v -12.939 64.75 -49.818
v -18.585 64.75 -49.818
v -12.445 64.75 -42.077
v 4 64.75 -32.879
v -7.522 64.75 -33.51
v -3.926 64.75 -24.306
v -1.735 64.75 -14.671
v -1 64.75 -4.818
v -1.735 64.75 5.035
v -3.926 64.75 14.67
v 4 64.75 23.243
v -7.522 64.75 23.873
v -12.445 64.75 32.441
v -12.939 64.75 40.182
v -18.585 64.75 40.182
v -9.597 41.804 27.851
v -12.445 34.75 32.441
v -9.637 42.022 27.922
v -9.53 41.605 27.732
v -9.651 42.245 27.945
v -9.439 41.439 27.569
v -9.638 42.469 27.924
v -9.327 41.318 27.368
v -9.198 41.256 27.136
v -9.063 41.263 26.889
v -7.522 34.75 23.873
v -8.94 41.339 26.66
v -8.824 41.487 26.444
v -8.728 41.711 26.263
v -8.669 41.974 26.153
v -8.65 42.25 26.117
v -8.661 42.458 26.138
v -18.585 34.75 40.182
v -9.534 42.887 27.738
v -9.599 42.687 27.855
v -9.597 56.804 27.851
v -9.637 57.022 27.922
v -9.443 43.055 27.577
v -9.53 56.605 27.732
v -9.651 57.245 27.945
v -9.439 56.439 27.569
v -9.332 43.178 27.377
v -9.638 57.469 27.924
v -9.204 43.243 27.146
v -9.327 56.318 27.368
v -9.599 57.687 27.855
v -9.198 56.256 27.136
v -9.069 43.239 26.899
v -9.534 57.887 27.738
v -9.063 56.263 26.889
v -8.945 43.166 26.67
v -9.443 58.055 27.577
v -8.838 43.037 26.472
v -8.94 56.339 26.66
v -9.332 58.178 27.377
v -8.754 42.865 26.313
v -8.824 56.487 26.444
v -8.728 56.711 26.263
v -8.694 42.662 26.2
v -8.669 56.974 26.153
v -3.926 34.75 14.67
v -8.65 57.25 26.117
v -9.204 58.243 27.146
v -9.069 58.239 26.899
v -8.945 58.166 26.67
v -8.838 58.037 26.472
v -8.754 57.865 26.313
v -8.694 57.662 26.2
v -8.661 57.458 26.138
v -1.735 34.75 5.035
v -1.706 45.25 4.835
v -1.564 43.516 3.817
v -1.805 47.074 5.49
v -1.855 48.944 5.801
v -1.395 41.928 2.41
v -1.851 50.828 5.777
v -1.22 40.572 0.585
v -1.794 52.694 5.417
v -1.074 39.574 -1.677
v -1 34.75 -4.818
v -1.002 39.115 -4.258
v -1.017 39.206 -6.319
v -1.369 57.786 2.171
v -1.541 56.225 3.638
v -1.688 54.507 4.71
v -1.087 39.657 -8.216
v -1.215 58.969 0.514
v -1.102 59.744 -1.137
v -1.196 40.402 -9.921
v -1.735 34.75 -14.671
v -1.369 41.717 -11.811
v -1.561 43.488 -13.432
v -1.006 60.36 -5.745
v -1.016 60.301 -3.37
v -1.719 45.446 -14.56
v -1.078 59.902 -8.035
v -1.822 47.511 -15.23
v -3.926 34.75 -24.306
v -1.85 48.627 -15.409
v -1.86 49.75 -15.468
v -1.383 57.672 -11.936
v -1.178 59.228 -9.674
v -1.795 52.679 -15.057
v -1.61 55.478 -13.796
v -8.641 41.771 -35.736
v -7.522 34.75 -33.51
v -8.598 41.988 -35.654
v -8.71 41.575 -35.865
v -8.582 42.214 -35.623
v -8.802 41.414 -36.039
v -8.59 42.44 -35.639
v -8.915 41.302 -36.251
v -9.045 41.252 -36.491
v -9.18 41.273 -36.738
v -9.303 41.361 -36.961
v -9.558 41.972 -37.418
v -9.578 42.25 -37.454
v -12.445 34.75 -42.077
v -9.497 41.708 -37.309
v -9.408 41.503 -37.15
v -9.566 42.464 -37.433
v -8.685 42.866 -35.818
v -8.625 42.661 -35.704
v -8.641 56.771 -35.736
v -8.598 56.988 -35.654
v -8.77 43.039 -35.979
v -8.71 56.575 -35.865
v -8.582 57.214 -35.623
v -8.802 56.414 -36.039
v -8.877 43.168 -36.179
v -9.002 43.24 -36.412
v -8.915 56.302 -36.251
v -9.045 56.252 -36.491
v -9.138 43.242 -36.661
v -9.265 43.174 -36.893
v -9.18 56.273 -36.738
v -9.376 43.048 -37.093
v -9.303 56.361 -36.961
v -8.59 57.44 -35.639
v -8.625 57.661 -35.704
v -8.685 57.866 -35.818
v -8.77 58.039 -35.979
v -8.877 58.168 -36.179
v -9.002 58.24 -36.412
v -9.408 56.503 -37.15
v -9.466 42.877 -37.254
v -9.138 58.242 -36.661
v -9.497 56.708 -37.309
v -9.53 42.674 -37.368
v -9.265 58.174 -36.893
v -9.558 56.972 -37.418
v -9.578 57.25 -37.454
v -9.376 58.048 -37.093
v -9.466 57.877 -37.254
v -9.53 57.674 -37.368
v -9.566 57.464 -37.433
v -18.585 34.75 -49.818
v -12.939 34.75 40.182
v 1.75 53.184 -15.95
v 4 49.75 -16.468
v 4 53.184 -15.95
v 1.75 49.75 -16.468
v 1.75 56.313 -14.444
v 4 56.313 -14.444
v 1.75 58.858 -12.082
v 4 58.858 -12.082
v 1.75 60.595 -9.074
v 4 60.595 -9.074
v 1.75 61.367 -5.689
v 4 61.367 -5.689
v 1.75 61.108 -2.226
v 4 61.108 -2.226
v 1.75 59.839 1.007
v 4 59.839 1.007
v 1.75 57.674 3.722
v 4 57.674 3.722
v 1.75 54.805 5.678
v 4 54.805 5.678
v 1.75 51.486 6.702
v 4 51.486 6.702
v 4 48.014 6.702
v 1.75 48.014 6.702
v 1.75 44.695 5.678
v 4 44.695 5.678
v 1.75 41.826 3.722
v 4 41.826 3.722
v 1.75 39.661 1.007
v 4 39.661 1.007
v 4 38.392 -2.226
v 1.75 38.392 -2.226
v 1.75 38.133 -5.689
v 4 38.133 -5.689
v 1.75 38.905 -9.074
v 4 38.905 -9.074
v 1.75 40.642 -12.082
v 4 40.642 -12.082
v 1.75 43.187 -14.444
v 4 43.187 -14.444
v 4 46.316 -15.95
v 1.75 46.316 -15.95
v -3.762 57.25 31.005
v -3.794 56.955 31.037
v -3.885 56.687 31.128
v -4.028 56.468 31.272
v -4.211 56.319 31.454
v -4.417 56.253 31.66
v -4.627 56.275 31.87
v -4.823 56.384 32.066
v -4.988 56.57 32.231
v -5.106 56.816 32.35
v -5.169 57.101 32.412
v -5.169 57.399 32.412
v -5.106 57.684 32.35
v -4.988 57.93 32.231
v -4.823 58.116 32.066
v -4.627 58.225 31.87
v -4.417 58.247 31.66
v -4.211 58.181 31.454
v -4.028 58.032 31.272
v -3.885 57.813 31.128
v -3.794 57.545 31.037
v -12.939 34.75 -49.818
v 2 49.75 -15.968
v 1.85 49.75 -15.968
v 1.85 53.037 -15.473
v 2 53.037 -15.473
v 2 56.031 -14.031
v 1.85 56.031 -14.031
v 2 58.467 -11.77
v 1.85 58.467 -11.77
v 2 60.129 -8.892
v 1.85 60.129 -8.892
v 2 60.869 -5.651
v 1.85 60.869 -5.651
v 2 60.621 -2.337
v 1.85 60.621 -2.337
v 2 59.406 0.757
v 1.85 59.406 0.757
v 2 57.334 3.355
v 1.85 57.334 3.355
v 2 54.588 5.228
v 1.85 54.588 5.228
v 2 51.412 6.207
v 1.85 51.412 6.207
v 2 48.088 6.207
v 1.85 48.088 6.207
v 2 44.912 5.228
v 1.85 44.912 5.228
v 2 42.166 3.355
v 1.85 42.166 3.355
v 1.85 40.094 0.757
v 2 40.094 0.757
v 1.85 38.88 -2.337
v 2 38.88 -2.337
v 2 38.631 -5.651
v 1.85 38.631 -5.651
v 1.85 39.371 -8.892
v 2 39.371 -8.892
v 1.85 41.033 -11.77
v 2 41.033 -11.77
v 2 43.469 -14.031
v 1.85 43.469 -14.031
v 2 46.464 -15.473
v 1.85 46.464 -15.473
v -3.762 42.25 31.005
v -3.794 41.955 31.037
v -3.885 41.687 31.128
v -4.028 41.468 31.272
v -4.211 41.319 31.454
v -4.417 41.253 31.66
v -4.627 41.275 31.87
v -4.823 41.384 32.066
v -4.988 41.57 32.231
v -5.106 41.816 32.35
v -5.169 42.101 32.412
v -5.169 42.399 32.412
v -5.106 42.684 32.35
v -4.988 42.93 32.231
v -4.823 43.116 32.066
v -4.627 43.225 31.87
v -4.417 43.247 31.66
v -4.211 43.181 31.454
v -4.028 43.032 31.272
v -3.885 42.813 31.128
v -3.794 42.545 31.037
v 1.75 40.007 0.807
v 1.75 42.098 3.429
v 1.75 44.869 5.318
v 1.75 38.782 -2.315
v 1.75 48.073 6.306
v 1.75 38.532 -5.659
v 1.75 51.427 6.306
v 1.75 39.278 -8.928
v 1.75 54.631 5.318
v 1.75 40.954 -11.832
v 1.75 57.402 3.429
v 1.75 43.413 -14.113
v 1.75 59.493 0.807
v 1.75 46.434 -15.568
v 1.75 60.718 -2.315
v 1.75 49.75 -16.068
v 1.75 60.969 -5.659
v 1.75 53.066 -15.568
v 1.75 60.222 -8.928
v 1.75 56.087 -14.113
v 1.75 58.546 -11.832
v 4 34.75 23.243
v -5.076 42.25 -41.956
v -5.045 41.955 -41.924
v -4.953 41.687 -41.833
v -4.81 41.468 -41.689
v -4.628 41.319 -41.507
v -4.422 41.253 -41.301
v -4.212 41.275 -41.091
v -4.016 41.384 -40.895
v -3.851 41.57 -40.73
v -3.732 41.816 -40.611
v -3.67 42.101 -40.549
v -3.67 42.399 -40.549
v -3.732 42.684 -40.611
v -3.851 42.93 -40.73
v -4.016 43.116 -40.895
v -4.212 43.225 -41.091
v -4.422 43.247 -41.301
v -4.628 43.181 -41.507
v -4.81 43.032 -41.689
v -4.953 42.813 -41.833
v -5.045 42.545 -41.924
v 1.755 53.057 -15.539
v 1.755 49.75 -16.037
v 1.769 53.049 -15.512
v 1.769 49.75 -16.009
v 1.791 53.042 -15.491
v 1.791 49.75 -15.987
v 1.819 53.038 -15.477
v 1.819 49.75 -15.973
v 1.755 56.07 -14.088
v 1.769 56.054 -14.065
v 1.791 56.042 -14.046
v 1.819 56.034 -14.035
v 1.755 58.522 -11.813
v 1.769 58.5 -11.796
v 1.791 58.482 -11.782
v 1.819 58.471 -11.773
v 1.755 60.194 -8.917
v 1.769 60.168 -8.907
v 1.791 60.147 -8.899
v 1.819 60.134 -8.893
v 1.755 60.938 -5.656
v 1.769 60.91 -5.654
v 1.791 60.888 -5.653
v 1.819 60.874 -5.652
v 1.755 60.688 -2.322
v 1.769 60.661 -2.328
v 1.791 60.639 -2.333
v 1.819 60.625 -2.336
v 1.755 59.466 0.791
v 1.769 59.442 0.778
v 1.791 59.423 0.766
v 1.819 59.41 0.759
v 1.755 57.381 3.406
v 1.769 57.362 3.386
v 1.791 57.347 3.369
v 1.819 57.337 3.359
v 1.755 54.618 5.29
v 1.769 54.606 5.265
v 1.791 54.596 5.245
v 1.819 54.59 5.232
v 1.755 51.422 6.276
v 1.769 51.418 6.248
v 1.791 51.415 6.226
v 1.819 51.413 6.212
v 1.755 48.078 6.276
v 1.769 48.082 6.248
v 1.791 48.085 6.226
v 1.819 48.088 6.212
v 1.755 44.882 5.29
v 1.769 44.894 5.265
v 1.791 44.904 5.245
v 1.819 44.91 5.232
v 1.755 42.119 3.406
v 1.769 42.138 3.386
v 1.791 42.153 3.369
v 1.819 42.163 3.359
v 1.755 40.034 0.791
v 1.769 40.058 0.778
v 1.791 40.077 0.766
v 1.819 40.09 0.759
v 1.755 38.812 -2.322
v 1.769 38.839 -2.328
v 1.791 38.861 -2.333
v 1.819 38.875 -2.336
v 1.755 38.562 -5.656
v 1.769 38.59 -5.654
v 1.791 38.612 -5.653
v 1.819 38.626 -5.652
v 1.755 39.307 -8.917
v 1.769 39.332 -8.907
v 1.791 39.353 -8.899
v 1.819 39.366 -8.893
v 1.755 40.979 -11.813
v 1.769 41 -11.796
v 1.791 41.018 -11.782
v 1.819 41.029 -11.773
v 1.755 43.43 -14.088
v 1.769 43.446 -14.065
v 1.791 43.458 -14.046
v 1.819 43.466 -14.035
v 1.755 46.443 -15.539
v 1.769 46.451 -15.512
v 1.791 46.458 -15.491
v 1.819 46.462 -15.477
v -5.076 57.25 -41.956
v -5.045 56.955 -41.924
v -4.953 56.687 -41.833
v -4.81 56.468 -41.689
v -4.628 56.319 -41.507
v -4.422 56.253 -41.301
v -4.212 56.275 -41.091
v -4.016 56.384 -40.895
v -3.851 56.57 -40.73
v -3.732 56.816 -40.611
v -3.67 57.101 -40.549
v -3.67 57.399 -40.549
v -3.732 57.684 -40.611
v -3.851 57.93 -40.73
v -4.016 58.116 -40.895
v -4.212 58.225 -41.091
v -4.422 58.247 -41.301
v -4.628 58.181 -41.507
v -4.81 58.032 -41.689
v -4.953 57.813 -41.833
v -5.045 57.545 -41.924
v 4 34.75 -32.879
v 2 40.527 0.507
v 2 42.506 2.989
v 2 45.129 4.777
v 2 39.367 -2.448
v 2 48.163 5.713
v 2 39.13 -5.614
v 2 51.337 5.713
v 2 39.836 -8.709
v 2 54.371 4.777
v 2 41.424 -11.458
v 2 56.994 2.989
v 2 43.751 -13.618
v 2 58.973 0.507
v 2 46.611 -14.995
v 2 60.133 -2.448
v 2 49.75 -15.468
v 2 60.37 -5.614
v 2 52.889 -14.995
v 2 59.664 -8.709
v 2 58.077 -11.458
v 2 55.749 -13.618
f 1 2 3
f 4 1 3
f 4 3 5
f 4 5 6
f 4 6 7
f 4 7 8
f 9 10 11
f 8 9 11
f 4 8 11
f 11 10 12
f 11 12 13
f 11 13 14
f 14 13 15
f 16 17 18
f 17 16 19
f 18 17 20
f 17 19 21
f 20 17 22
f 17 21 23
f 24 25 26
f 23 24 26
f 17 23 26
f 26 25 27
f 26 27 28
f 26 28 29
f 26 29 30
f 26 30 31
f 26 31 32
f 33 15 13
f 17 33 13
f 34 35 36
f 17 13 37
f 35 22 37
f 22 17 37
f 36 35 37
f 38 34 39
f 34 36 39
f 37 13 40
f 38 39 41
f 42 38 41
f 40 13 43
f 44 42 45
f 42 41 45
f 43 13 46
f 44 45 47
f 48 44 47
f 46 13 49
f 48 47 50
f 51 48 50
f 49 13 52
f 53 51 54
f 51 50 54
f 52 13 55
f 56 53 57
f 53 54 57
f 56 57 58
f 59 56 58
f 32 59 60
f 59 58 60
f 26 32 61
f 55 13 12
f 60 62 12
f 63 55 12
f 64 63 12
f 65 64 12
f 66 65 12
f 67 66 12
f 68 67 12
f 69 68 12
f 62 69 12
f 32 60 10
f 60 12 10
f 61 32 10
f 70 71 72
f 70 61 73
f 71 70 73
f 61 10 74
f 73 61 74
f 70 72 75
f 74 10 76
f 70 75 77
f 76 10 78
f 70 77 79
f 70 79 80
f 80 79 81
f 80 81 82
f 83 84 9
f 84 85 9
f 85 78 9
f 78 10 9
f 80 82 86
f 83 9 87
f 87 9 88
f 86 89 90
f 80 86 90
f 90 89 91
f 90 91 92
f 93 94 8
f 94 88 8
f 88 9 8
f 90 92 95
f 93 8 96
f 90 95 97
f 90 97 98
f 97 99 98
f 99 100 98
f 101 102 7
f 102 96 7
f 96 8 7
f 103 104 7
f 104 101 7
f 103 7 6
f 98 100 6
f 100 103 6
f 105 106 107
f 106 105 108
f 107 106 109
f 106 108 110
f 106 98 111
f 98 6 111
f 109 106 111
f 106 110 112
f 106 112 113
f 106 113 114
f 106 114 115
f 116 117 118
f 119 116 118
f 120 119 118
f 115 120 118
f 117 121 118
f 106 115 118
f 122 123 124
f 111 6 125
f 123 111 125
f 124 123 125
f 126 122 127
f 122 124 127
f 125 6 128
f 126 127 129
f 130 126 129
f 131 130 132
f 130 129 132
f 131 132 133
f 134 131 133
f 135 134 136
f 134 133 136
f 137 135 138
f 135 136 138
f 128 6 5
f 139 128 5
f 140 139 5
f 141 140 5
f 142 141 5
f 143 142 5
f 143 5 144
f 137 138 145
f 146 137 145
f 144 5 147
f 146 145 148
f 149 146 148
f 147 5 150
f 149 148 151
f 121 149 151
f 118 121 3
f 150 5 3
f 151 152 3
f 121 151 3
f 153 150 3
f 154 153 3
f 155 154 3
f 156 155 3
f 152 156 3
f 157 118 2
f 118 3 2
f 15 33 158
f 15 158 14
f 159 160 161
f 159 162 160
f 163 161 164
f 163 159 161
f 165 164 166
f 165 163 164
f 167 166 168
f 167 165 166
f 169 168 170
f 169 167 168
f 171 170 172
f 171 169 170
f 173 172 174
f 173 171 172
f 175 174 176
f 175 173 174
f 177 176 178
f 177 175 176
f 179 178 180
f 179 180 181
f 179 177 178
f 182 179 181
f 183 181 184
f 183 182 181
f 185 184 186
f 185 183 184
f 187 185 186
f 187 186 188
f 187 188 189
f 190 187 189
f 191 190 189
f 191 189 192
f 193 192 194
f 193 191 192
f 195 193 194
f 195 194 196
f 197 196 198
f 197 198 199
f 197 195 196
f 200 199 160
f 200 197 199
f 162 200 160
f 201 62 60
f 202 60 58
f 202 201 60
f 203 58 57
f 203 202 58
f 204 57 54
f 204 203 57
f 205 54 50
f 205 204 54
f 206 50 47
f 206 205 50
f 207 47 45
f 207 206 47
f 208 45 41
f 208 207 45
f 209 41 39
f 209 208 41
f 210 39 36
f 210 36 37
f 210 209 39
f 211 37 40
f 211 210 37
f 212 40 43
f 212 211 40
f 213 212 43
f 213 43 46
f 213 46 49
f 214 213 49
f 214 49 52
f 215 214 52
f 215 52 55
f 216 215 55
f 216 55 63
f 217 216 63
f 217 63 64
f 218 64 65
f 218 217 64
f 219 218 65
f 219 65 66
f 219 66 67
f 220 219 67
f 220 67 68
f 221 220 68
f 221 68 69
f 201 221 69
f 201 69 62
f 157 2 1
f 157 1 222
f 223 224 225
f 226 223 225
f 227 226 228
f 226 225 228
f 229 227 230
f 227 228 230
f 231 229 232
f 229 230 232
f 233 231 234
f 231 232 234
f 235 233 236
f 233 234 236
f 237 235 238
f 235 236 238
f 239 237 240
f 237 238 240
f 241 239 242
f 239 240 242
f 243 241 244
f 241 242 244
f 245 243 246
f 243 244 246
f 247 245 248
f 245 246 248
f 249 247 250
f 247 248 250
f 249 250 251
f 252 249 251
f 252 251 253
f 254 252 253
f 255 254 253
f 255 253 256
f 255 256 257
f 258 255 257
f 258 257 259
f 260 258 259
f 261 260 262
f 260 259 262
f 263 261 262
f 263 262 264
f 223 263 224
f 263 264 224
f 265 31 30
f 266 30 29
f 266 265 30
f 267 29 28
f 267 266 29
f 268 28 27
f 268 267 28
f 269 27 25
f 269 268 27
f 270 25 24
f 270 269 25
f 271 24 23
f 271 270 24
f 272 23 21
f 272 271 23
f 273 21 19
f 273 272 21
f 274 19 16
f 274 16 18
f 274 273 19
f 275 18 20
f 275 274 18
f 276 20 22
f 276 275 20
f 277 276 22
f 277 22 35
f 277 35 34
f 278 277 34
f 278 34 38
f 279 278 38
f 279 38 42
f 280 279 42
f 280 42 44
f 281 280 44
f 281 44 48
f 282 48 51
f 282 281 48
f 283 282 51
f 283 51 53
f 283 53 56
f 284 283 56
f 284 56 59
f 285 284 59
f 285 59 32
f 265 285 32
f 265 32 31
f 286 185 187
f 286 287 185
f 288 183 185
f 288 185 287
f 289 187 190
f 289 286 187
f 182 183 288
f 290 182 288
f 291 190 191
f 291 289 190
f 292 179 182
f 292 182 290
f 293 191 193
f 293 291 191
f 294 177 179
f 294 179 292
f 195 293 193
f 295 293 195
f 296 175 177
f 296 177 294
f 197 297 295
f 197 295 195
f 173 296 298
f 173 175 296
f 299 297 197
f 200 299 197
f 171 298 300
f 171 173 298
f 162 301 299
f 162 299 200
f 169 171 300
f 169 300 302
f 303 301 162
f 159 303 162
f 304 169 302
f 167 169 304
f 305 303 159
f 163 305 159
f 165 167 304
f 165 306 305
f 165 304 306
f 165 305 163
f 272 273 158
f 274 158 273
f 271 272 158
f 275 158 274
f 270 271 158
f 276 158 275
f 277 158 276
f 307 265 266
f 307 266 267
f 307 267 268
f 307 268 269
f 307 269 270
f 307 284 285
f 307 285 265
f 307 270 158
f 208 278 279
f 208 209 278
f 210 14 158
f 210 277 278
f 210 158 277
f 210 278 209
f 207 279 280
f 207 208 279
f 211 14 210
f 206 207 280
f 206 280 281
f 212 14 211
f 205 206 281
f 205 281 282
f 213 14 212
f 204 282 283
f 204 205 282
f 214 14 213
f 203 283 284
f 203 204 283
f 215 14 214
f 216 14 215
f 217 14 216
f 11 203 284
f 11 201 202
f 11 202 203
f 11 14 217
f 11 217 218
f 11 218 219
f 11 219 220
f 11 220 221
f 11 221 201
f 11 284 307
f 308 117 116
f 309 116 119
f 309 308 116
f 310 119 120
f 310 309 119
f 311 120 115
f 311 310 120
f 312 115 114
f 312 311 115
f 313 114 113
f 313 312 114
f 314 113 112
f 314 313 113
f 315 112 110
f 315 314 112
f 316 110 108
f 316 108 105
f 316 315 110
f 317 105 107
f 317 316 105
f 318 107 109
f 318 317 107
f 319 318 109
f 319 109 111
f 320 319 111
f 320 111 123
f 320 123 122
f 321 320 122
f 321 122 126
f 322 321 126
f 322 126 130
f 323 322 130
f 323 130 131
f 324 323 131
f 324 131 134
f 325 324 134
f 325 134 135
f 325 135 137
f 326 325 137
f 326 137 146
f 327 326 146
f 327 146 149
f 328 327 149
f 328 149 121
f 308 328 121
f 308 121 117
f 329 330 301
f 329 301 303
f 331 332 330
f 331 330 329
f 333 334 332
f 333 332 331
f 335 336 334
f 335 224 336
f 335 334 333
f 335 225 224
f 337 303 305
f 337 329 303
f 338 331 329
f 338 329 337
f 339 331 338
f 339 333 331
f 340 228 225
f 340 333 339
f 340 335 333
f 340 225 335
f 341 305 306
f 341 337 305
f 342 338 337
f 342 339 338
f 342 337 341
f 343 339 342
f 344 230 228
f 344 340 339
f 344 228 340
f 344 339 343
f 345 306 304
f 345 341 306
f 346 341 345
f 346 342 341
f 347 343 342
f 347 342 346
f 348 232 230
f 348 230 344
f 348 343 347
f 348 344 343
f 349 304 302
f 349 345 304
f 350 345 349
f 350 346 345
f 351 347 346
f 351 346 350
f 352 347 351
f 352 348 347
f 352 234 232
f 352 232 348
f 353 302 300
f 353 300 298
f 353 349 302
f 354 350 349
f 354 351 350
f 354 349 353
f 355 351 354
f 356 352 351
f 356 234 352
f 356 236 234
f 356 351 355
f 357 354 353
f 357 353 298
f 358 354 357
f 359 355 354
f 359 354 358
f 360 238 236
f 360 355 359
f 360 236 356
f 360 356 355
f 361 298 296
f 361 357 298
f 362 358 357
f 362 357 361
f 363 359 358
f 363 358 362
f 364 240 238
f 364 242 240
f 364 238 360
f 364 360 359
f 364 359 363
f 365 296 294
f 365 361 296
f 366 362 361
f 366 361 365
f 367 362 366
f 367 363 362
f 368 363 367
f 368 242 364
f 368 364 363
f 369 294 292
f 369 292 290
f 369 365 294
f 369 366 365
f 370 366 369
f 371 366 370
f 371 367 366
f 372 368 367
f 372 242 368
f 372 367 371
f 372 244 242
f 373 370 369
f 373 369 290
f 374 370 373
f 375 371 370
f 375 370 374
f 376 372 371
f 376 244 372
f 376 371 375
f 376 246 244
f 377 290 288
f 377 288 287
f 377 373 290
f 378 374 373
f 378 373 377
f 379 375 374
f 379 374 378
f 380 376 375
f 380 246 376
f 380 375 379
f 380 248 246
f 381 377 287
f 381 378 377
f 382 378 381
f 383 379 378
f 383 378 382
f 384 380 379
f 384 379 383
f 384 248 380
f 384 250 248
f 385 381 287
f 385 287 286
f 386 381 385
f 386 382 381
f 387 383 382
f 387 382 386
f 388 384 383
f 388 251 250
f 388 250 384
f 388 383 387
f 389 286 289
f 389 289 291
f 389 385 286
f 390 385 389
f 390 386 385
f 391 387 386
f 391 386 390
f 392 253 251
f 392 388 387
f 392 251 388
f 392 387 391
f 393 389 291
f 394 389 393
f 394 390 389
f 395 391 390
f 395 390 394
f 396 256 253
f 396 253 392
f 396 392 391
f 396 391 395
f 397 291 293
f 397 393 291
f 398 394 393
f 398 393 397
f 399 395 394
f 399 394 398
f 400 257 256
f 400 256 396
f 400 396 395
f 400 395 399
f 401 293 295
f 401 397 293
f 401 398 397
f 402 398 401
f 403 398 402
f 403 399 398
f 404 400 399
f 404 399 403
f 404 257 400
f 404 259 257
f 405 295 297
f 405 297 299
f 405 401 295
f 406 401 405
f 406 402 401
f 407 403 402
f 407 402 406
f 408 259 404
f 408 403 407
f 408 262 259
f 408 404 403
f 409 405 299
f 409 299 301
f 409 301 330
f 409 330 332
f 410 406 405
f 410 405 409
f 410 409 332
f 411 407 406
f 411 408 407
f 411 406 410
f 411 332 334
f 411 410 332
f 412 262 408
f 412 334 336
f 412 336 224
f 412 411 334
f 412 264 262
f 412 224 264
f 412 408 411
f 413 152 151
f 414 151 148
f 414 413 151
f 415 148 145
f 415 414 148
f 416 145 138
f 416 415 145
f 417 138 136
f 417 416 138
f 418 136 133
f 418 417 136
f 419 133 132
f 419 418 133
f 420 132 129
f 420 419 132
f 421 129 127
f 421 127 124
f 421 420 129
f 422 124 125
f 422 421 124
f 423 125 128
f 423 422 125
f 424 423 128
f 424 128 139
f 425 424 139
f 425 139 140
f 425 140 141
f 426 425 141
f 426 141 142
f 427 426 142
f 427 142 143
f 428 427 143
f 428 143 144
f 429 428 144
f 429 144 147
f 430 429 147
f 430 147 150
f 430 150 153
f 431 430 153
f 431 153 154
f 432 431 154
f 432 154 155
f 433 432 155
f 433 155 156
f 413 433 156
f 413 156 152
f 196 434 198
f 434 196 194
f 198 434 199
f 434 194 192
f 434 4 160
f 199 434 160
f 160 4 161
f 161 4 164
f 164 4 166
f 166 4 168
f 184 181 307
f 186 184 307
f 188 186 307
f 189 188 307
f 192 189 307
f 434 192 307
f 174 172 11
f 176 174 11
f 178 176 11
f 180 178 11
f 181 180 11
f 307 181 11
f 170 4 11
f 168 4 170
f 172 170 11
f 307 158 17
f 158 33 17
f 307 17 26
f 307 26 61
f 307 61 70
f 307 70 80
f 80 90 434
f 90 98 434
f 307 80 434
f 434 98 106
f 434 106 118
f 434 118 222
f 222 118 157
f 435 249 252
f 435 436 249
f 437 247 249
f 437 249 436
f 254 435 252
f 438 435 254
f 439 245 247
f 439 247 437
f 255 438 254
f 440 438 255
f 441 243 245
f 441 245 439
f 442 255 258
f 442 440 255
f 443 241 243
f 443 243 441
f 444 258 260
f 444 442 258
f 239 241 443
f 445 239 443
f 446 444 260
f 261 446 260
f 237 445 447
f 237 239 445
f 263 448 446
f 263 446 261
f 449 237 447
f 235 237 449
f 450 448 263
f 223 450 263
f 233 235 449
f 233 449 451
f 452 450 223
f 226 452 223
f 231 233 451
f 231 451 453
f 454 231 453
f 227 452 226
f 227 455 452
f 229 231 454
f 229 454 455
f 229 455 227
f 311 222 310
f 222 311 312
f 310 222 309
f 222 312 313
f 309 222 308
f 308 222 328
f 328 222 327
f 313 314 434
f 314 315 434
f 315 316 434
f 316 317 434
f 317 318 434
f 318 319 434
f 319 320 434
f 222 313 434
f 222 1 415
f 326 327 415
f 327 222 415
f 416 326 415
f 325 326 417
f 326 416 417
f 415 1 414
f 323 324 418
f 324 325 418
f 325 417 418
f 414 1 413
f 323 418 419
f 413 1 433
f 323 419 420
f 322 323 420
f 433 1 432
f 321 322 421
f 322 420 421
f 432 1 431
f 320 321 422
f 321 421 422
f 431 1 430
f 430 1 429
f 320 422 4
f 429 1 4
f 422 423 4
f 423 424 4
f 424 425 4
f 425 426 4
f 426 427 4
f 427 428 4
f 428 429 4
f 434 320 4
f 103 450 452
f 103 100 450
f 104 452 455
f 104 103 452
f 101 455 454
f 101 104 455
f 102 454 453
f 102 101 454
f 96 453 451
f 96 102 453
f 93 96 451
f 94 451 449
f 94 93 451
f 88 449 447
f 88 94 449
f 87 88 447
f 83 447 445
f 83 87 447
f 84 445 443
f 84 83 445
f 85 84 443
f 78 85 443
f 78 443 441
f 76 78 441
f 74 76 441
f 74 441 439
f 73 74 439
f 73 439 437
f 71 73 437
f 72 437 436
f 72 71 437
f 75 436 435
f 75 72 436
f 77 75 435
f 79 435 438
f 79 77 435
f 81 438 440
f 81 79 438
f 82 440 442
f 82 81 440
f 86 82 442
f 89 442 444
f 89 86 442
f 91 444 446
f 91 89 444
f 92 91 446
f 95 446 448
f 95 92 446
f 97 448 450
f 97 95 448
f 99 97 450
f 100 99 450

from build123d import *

# Parameters (mm, degrees)
SKETCH1_R           = 10.65
BOSS_EXTRUDE1_DEPTH = 4
CUT_EXTRUDE2_START  = -2
SKETCH4_R           = 11.65
SKETCH4_R_2         = 10.65
CUT_EXTRUDE2_DEPTH  = 2
CUT_EXTRUDE3_START  = -0.25
SKETCH5_R           = 11.65
SKETCH5_R_2         = 11.15
CUT_EXTRUDE3_DEPTH  = 0.25
FILLET1_R           = 0.1
BOSS_EXTRUDE3_DEPTH = 30
CUT_EXTRUDE6_START  = -30
SKETCH12_R          = 10.65
CUT_EXTRUDE6_DEPTH  = 30
CUT_EXTRUDE7_DEPTH  = 30
SKETCH14_R          = 1
CUT_EXTRUDE8_DEPTH  = 30
SKETCH15_R          = 1
CUT_EXTRUDE9_DEPTH  = 30


with BuildPart() as part:
    # Sketch1 → Boss-Extrude1 (new body)
    with BuildSketch(Plane(origin=(0, 0, 0), x_dir=(0, 0, -1), z_dir=(1, 0, 0))):
        Polygon((44.818066557, 64.750067007), (49.818066557, 64.750067007), (49.818066557, 34.750067007), (44.818066557, 34.750067007), (-35.181933443, 34.750067007), (-40.181933443, 34.750067007), (-40.181933443, 64.750067007), (-35.181933443, 64.750067007), align=None)
        with Locations((4.818066557, 49.750067007)):
            Circle(SKETCH1_R, mode=Mode.SUBTRACT)
    extrude(amount=BOSS_EXTRUDE1_DEPTH)

    # Sketch4 → Cut-Extrude2 (cut)
    with BuildSketch(Plane(origin=(4, 0, 0), x_dir=(0, 0, -1), z_dir=(1, 0, 0)).offset(CUT_EXTRUDE2_START)):
        with Locations((4.818066557, 49.750067007)):
            Circle(SKETCH4_R)
        with Locations((4.818066557, 49.750067007)):
            Circle(SKETCH4_R_2, mode=Mode.SUBTRACT)
    extrude(amount=CUT_EXTRUDE2_DEPTH, mode=Mode.SUBTRACT)

    # Sketch5 → Cut-Extrude3 (cut)
    with BuildSketch(Plane(origin=(2, 0, 0), x_dir=(0, 0, -1), z_dir=(1, 0, 0)).offset(CUT_EXTRUDE3_START)):
        with Locations((4.818066557, 49.750067007)):
            Circle(SKETCH5_R)
        with Locations((4.818066557, 49.750067007)):
            Circle(SKETCH5_R_2, mode=Mode.SUBTRACT)
    extrude(amount=CUT_EXTRUDE3_DEPTH, mode=Mode.SUBTRACT)

    # Fillet1
    fillet1_edges = [part.edges().sort_by_distance(p)[0] for p in [
        (1.75, 49.750067007, 6.331933443),
    ]]
    fillet(fillet1_edges, radius=FILLET1_R)

    # Sketch11 → Boss-Extrude3 (add)
    with BuildSketch(Plane(origin=(0, 64.750067007, 0), x_dir=(1, 0, 0), z_dir=(0, 1, 0))):
        with BuildLine():
            Line((0, 49.818066557), (0, -40.181933443))
            Line((0, -40.181933443), (-18.584993082, -40.181933443))
            ThreePointArc((-18.584993082, -40.181933443), (-1, 4.818066557), (-18.584993082, 49.818066557))
            Line((-18.584993082, 49.818066557), (0, 49.818066557))
        make_face()
    extrude(amount=-BOSS_EXTRUDE3_DEPTH)

    # Sketch12 → Cut-Extrude6 (cut)
    with BuildSketch(Plane(origin=(0, 0, 0), x_dir=(0, 0, -1), z_dir=(1, 0, 0)).offset(CUT_EXTRUDE6_START)):
        with Locations((4.818066557, 49.750067007)):
            Circle(SKETCH12_R)
    extrude(amount=CUT_EXTRUDE6_DEPTH, mode=Mode.SUBTRACT)

    # Sketch13 → Cut-Extrude7 (cut)
    with BuildSketch(Plane(origin=(0, 64.750067007, 0), x_dir=(1, 0, 0), z_dir=(0, 1, 0))):
        Polygon((-12.938744811, 49.818066557), (4, 32.879321746), (4, 49.818066557), align=None)
        Polygon((-12.938744811, -40.181933443), (4, -23.243188631), (4, -40.181933443), align=None)
    extrude(amount=-CUT_EXTRUDE7_DEPTH, mode=Mode.SUBTRACT)

    # Sketch14 → Cut-Extrude8 (cut)
    with BuildSketch(Plane(origin=(-109.620613418, 0, 136.863802049), x_dir=(-0.7071067811865562, 0, 0.7071067811865388), z_dir=(-0.7071067811865388, 0, -0.7071067811865562))):
        with Locations(Location((-148.70631114, 57.250067007, 0), (0, 0, 180))):
            Circle(SKETCH14_R)
        with Locations(Location((-148.70631114, 42.250067007, 0), (0, 0, 180))):
            Circle(SKETCH14_R)
    extrude(amount=CUT_EXTRUDE8_DEPTH, mode=Mode.SUBTRACT)

    # Sketch15 → Cut-Extrude9 (cut)
    with BuildSketch(Plane(origin=(18.539804897, 0, -18.339516848), x_dir=(0.7071067811865562, 0, 0.7071067811865388), z_dir=(-0.7071067811865388, 0, 0.7071067811865562))):
        with Locations(Location((-32.398265563, 57.250067007, 0), (0, 0, 180))):
            Circle(SKETCH15_R)
        with Locations(Location((-32.398265563, 42.250067007, 0), (0, 0, 180))):
            Circle(SKETCH15_R)
    extrude(amount=CUT_EXTRUDE9_DEPTH, mode=Mode.SUBTRACT)


solid = part.part
